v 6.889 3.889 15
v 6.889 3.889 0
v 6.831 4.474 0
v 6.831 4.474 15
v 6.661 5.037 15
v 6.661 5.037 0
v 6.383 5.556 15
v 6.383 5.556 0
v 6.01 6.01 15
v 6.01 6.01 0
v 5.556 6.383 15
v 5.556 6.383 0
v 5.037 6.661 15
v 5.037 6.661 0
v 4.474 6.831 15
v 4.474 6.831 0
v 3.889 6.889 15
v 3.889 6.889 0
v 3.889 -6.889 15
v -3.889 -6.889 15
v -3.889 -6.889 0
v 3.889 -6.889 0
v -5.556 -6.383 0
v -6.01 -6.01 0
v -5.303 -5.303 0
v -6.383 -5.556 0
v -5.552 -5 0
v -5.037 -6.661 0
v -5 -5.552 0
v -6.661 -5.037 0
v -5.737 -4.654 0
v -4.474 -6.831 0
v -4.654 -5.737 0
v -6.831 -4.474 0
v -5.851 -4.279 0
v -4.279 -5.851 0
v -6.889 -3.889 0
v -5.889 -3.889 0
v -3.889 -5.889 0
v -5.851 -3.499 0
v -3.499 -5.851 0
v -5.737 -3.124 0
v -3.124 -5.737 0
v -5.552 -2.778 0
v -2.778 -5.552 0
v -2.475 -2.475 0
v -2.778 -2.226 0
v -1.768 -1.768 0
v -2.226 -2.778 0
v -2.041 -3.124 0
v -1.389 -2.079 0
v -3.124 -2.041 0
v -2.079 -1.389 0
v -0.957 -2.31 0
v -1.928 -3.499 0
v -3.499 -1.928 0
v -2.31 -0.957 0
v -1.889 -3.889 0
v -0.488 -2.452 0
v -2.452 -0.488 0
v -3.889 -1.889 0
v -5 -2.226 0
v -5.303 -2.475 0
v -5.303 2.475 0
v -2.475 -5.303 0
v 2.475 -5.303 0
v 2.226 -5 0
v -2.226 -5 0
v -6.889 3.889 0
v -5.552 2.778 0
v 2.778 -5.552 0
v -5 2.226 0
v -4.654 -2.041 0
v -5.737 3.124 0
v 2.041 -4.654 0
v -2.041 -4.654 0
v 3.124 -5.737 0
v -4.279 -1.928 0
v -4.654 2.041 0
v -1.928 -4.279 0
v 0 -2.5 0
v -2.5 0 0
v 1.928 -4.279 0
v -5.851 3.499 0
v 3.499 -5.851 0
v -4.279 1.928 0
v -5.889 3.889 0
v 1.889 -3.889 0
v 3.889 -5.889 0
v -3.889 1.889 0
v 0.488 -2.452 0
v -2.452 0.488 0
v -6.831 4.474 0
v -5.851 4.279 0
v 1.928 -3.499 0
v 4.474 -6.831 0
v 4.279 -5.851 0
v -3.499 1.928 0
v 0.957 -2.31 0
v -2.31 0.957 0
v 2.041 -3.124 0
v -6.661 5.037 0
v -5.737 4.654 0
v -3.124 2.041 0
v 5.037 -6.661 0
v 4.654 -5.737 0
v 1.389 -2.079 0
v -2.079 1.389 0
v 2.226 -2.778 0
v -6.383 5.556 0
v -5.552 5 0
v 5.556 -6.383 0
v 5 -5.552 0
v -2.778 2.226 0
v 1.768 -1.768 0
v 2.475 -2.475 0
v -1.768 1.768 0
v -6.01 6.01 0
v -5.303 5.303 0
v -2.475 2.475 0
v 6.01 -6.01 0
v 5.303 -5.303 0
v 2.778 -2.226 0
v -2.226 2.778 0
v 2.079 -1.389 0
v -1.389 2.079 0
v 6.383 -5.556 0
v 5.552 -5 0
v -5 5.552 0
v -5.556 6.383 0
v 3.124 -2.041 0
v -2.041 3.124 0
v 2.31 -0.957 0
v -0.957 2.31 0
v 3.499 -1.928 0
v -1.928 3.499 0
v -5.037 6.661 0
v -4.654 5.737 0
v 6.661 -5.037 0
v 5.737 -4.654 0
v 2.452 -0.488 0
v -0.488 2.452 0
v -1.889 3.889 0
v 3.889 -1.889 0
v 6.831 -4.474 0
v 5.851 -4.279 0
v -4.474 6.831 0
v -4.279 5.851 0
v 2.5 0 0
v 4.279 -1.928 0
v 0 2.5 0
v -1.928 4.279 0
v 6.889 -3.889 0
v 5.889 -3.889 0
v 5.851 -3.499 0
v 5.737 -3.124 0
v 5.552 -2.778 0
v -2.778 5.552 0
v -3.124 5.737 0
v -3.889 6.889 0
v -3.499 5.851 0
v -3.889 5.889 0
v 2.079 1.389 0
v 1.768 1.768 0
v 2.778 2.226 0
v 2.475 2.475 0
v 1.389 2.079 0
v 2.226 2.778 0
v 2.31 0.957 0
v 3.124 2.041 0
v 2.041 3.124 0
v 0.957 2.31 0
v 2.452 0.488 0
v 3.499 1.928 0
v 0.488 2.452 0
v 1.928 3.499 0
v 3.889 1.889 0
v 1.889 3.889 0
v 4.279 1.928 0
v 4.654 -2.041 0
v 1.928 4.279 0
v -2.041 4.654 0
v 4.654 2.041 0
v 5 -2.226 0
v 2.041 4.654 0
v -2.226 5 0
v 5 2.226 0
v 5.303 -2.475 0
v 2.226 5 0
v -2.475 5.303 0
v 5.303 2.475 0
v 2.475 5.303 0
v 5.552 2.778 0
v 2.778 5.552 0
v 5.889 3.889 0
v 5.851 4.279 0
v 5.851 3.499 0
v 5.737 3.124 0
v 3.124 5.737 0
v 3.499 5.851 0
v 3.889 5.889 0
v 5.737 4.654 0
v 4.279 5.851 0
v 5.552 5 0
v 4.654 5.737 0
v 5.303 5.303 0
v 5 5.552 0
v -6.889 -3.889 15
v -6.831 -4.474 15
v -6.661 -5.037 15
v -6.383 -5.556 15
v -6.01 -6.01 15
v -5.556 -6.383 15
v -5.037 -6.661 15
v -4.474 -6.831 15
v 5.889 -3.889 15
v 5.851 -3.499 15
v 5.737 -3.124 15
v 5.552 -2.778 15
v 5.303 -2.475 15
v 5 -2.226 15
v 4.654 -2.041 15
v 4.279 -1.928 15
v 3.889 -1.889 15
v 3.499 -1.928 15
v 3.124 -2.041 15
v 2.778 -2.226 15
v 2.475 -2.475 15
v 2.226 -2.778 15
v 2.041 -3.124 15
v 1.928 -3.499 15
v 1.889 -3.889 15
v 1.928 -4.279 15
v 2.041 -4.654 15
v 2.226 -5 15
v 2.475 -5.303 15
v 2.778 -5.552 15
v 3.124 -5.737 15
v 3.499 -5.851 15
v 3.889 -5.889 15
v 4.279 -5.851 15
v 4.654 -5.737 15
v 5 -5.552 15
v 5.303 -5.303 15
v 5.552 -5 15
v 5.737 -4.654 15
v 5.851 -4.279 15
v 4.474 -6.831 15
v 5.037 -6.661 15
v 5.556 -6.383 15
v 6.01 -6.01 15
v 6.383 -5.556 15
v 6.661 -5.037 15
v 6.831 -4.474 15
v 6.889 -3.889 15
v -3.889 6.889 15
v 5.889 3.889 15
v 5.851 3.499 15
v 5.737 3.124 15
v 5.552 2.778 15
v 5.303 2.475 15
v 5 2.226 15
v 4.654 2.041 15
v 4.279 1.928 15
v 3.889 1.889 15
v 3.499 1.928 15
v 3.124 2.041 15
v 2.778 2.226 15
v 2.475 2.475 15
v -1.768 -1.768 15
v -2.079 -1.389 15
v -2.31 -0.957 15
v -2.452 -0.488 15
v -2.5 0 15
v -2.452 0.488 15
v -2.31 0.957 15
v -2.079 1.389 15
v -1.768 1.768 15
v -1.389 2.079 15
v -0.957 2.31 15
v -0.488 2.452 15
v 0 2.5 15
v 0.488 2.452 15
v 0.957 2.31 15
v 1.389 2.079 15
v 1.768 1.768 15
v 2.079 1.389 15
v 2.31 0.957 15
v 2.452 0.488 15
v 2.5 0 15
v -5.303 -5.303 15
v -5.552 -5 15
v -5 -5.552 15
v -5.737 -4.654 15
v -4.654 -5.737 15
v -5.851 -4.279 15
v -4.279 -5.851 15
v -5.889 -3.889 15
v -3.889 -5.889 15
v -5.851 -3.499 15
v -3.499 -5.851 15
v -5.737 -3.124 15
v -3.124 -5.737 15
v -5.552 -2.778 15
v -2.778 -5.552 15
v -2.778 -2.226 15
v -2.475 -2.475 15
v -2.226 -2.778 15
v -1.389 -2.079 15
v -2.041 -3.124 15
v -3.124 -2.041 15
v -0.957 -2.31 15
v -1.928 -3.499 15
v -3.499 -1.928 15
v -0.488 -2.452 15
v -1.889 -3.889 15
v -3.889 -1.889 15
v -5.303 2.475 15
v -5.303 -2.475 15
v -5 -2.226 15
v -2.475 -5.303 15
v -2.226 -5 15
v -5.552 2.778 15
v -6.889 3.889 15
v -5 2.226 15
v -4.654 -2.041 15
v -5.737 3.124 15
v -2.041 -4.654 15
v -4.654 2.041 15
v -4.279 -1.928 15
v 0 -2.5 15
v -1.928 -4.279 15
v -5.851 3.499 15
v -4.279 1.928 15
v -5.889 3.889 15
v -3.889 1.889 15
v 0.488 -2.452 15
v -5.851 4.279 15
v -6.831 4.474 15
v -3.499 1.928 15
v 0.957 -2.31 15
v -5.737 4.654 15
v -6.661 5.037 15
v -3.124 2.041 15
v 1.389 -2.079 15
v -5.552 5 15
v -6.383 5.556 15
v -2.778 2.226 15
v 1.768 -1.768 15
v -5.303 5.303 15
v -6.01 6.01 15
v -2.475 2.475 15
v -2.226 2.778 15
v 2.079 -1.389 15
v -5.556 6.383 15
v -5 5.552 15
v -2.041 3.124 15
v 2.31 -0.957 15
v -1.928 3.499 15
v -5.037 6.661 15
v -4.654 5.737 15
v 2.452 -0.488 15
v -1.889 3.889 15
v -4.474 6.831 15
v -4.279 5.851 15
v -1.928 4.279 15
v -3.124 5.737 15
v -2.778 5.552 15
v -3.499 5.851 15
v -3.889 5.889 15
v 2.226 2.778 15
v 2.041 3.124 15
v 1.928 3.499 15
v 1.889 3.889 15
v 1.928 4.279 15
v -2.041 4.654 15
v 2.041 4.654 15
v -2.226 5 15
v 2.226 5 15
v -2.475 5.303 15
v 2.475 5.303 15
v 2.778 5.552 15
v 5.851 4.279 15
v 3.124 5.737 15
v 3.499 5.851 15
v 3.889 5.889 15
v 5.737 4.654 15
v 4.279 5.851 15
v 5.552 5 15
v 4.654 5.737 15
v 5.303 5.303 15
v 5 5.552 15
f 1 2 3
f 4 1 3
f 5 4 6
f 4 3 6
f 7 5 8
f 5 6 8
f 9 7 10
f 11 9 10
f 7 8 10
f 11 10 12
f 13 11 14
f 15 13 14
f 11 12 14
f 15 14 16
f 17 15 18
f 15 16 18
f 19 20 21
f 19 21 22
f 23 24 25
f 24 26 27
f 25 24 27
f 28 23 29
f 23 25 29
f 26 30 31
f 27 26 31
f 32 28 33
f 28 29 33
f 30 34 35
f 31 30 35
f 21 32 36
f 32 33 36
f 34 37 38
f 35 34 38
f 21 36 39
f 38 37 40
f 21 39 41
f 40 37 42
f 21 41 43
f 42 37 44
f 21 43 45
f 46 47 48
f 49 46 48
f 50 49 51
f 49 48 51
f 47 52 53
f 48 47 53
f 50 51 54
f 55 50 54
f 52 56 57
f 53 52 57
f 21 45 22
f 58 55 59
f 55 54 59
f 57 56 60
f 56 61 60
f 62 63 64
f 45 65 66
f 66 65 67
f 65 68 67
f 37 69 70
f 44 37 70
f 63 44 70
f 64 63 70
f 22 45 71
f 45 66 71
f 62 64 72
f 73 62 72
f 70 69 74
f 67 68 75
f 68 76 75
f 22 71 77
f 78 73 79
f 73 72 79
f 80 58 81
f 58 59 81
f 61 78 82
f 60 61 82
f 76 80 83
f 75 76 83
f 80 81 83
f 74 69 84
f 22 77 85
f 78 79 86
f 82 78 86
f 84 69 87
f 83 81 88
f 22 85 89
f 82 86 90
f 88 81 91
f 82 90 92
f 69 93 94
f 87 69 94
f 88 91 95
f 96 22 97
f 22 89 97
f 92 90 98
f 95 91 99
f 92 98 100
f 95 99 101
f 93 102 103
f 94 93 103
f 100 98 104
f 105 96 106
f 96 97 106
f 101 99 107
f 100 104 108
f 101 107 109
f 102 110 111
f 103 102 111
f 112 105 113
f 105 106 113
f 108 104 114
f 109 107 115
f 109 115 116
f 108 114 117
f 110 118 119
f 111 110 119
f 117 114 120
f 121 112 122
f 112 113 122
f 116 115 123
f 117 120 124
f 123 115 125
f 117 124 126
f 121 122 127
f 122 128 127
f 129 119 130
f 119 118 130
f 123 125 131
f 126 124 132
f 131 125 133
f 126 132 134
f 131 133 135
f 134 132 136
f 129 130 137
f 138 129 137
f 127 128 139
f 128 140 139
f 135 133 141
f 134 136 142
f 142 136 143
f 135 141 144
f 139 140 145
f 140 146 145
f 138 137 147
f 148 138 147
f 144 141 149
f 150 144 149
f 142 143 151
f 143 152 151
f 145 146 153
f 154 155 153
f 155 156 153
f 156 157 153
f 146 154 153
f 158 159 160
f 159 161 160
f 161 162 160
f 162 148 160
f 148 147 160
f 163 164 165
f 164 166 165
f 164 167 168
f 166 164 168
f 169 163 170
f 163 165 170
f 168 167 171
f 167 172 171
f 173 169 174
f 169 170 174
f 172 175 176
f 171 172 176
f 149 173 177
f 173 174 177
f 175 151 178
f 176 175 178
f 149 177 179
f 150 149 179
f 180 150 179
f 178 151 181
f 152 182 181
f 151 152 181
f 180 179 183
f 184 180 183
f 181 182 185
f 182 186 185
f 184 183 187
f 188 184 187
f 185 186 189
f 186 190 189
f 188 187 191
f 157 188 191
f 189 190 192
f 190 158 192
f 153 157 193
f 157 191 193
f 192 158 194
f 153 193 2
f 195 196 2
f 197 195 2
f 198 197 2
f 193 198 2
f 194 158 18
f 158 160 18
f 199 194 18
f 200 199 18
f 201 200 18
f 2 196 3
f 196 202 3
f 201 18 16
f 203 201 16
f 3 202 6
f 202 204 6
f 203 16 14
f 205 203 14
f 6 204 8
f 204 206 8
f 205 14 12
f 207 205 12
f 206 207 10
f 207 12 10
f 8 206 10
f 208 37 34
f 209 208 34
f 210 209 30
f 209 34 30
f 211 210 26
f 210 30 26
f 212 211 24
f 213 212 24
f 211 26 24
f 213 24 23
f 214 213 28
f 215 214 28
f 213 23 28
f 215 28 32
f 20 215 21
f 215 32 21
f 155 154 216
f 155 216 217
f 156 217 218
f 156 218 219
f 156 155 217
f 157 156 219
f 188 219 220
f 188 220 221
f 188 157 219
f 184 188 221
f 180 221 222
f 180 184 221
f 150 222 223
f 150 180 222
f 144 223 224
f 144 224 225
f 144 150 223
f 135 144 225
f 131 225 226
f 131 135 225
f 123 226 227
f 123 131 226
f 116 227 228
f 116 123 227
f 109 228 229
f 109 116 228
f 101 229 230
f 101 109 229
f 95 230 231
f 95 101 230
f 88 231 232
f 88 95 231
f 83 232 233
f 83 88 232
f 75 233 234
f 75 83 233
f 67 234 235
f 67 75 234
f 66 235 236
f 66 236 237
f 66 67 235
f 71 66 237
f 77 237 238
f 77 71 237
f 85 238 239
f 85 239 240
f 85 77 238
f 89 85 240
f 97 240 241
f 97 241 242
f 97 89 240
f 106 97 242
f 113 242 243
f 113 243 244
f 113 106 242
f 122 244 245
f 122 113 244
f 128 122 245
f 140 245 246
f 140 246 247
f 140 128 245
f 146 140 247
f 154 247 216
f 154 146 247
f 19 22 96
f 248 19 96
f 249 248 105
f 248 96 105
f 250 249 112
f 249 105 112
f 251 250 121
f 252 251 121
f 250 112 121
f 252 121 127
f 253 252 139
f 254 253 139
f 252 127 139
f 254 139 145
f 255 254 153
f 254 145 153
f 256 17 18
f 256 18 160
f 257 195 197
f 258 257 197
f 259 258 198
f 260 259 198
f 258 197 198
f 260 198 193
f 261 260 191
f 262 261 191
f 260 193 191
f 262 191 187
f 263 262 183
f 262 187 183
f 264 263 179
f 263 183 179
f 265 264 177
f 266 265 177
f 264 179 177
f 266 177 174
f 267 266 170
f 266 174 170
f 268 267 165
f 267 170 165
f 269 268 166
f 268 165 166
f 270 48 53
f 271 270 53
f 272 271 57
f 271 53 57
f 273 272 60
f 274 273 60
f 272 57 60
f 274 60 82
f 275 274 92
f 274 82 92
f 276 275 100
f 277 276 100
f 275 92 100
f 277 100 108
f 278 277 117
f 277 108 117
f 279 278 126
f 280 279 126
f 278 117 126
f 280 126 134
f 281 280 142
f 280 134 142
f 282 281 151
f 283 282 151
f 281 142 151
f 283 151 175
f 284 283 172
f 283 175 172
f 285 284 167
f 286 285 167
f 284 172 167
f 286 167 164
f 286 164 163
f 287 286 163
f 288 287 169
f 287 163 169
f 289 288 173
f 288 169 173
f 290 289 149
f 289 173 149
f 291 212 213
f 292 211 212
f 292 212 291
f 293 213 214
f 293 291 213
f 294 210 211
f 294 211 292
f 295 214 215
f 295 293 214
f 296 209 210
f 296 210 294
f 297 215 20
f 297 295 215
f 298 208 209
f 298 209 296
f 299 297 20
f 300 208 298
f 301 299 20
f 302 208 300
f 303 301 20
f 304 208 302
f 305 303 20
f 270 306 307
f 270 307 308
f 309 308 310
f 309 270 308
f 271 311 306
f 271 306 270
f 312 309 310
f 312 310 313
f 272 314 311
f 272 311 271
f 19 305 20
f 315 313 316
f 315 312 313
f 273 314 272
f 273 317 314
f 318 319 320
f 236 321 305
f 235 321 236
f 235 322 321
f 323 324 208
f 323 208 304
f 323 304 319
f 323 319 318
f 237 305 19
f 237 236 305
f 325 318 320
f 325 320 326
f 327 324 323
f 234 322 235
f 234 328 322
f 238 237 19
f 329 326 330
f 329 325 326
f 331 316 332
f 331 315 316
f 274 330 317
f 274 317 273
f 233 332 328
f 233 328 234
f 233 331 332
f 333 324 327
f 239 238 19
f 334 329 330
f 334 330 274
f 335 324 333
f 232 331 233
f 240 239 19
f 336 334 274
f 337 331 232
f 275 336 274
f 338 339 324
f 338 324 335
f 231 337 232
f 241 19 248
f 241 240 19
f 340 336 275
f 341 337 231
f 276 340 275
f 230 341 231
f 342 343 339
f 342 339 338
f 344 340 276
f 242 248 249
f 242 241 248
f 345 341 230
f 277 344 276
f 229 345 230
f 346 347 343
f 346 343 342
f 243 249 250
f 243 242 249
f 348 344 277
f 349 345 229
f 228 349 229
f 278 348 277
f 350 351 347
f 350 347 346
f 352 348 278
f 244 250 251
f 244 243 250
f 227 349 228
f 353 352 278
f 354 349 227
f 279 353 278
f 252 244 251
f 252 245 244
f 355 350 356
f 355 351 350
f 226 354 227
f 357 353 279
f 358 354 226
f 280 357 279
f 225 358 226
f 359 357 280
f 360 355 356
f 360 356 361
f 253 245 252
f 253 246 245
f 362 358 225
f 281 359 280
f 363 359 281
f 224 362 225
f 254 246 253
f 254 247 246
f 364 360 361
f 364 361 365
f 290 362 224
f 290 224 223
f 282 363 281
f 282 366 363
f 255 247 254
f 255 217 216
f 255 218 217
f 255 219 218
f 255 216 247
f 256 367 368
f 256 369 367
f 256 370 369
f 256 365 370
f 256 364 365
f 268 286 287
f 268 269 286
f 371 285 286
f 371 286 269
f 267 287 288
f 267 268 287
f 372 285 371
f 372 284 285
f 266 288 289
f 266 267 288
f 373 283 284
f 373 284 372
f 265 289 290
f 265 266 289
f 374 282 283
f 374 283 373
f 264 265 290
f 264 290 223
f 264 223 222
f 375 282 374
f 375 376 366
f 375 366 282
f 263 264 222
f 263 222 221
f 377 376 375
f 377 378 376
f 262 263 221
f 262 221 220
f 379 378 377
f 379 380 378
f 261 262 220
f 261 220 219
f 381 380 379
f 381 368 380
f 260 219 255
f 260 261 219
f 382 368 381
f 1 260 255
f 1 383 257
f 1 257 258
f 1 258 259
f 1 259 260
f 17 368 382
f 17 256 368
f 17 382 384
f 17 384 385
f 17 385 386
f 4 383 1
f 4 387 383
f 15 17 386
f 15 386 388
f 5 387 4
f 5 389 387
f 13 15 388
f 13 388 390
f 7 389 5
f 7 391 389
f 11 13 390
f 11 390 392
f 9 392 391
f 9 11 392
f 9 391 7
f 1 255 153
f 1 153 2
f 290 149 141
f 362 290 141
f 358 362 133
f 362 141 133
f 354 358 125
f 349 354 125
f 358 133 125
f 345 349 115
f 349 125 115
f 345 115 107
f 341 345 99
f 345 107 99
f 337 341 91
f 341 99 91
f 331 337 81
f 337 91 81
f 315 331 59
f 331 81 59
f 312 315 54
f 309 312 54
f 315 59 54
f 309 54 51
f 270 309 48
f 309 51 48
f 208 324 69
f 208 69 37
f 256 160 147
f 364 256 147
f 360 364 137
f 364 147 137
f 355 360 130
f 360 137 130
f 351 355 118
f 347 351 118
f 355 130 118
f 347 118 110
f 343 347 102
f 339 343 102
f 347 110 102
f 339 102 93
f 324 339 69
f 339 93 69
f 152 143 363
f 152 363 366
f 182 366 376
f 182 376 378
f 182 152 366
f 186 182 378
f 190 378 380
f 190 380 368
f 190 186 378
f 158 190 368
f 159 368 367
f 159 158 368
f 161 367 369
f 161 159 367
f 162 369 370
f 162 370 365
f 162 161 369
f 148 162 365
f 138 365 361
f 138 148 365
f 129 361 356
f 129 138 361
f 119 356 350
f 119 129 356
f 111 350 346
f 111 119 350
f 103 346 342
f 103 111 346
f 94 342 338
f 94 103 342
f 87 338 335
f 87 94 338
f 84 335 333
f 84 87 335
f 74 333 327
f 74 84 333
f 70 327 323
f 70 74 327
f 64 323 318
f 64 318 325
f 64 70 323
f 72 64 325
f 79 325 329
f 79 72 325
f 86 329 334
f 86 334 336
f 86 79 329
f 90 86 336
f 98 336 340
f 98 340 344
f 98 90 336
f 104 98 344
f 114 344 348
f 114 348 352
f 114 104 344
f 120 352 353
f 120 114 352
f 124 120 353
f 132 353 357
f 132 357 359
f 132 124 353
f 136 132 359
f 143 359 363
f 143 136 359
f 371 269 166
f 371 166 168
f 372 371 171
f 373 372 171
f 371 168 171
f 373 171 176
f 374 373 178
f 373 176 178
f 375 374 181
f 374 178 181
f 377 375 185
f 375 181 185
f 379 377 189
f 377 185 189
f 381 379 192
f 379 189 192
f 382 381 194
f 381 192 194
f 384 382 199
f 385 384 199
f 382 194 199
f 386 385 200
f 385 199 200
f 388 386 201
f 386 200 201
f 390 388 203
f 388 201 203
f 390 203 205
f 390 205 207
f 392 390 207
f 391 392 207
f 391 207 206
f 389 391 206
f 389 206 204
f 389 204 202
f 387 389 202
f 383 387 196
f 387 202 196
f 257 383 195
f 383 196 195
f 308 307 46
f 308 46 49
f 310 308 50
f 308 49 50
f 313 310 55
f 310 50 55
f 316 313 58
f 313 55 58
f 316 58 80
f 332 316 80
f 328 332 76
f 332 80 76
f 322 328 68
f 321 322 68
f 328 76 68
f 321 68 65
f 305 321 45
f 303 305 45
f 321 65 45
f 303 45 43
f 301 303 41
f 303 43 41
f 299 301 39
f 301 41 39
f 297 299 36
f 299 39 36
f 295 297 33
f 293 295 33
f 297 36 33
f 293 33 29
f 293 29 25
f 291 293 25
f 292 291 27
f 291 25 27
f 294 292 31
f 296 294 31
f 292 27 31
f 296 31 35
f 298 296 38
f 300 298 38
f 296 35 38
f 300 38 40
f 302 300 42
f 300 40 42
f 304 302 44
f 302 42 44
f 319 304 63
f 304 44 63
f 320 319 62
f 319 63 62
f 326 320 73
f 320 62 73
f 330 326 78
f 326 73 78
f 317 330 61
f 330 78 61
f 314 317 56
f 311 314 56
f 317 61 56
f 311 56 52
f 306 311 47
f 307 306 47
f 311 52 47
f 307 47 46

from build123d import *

# Parameters (mm, degrees)
F0_R     = 2
F1_DEPTH = 15


with BuildPart() as f1:
    # F0 (on Top) → F1 (new body)
    with BuildSketch(Plane.XY):
        with BuildLine():
            ThreePointArc((-2.474874, -2.474874), (-5.736846, -4.654454), (-1.889087, -3.889087))
            ThreePointArc((-1.889087, -3.889087), (-2.041328, -3.12372), (-2.474874, -2.474874))
        make_face()
        with BuildLine():
            ThreePointArc((5.889087, 3.889087), (3.12372, 5.736846), (2.474874, 2.474874))
            ThreePointArc((2.474874, 2.474874), (4.654454, 2.041328), (5.889087, 3.889087))
        make_face()
        with BuildLine():
            ThreePointArc((-6.889087, -3.889087), (-6.010408, -6.010408), (-3.889087, -6.889087))
            Line((-3.889087, -6.889087), (3.889087, -6.889087))
            ThreePointArc((3.889087, -6.889087), (6.010408, -6.010408), (6.889087, -3.889087))
            Line((6.889087, -3.889087), (6.889087, 3.889087))
            ThreePointArc((6.889087, 3.889087), (6.010408, 6.010408), (3.889087, 6.889087))
            Line((3.889087, 6.889087), (-3.889087, 6.889087))
            ThreePointArc((-3.889087, 6.889087), (-6.010408, 6.010408), (-6.889087, 3.889087))
            Line((-6.889087, 3.889087), (-6.889087, -3.889087))
        make_face()
        with BuildLine():
            ThreePointArc((-2.474874, -2.474874), (-2.041328, -3.12372), (-1.889087, -3.889087))
            ThreePointArc((-1.889087, -3.889087), (-5.736846, -4.654454), (-2.474874, -2.474874))
        make_face(mode=Mode.SUBTRACT)
        with Locations((3.889087, -3.889087)):
            Circle(F0_R, mode=Mode.SUBTRACT)
        with Locations((-3.889087, 3.889087)):
            Circle(F0_R, mode=Mode.SUBTRACT)
        with BuildLine():
            ThreePointArc((2.5, 0), (0.956709, -2.309699), (-1.767767, -1.767767))
            ThreePointArc((-1.767767, -1.767767), (-1.767767, 1.767767), (1.767767, 1.767767))
            ThreePointArc((1.767767, 1.767767), (2.309699, 0.956709), (2.5, 0))
        make_face(mode=Mode.SUBTRACT)
        with BuildLine():
            ThreePointArc((5.889087, 3.889087), (4.654454, 2.041328), (2.474874, 2.474874))
            ThreePointArc((2.474874, 2.474874), (3.12372, 5.736846), (5.889087, 3.889087))
        make_face(mode=Mode.SUBTRACT)
    extrude(amount=F1_DEPTH)


solid = f1.part
